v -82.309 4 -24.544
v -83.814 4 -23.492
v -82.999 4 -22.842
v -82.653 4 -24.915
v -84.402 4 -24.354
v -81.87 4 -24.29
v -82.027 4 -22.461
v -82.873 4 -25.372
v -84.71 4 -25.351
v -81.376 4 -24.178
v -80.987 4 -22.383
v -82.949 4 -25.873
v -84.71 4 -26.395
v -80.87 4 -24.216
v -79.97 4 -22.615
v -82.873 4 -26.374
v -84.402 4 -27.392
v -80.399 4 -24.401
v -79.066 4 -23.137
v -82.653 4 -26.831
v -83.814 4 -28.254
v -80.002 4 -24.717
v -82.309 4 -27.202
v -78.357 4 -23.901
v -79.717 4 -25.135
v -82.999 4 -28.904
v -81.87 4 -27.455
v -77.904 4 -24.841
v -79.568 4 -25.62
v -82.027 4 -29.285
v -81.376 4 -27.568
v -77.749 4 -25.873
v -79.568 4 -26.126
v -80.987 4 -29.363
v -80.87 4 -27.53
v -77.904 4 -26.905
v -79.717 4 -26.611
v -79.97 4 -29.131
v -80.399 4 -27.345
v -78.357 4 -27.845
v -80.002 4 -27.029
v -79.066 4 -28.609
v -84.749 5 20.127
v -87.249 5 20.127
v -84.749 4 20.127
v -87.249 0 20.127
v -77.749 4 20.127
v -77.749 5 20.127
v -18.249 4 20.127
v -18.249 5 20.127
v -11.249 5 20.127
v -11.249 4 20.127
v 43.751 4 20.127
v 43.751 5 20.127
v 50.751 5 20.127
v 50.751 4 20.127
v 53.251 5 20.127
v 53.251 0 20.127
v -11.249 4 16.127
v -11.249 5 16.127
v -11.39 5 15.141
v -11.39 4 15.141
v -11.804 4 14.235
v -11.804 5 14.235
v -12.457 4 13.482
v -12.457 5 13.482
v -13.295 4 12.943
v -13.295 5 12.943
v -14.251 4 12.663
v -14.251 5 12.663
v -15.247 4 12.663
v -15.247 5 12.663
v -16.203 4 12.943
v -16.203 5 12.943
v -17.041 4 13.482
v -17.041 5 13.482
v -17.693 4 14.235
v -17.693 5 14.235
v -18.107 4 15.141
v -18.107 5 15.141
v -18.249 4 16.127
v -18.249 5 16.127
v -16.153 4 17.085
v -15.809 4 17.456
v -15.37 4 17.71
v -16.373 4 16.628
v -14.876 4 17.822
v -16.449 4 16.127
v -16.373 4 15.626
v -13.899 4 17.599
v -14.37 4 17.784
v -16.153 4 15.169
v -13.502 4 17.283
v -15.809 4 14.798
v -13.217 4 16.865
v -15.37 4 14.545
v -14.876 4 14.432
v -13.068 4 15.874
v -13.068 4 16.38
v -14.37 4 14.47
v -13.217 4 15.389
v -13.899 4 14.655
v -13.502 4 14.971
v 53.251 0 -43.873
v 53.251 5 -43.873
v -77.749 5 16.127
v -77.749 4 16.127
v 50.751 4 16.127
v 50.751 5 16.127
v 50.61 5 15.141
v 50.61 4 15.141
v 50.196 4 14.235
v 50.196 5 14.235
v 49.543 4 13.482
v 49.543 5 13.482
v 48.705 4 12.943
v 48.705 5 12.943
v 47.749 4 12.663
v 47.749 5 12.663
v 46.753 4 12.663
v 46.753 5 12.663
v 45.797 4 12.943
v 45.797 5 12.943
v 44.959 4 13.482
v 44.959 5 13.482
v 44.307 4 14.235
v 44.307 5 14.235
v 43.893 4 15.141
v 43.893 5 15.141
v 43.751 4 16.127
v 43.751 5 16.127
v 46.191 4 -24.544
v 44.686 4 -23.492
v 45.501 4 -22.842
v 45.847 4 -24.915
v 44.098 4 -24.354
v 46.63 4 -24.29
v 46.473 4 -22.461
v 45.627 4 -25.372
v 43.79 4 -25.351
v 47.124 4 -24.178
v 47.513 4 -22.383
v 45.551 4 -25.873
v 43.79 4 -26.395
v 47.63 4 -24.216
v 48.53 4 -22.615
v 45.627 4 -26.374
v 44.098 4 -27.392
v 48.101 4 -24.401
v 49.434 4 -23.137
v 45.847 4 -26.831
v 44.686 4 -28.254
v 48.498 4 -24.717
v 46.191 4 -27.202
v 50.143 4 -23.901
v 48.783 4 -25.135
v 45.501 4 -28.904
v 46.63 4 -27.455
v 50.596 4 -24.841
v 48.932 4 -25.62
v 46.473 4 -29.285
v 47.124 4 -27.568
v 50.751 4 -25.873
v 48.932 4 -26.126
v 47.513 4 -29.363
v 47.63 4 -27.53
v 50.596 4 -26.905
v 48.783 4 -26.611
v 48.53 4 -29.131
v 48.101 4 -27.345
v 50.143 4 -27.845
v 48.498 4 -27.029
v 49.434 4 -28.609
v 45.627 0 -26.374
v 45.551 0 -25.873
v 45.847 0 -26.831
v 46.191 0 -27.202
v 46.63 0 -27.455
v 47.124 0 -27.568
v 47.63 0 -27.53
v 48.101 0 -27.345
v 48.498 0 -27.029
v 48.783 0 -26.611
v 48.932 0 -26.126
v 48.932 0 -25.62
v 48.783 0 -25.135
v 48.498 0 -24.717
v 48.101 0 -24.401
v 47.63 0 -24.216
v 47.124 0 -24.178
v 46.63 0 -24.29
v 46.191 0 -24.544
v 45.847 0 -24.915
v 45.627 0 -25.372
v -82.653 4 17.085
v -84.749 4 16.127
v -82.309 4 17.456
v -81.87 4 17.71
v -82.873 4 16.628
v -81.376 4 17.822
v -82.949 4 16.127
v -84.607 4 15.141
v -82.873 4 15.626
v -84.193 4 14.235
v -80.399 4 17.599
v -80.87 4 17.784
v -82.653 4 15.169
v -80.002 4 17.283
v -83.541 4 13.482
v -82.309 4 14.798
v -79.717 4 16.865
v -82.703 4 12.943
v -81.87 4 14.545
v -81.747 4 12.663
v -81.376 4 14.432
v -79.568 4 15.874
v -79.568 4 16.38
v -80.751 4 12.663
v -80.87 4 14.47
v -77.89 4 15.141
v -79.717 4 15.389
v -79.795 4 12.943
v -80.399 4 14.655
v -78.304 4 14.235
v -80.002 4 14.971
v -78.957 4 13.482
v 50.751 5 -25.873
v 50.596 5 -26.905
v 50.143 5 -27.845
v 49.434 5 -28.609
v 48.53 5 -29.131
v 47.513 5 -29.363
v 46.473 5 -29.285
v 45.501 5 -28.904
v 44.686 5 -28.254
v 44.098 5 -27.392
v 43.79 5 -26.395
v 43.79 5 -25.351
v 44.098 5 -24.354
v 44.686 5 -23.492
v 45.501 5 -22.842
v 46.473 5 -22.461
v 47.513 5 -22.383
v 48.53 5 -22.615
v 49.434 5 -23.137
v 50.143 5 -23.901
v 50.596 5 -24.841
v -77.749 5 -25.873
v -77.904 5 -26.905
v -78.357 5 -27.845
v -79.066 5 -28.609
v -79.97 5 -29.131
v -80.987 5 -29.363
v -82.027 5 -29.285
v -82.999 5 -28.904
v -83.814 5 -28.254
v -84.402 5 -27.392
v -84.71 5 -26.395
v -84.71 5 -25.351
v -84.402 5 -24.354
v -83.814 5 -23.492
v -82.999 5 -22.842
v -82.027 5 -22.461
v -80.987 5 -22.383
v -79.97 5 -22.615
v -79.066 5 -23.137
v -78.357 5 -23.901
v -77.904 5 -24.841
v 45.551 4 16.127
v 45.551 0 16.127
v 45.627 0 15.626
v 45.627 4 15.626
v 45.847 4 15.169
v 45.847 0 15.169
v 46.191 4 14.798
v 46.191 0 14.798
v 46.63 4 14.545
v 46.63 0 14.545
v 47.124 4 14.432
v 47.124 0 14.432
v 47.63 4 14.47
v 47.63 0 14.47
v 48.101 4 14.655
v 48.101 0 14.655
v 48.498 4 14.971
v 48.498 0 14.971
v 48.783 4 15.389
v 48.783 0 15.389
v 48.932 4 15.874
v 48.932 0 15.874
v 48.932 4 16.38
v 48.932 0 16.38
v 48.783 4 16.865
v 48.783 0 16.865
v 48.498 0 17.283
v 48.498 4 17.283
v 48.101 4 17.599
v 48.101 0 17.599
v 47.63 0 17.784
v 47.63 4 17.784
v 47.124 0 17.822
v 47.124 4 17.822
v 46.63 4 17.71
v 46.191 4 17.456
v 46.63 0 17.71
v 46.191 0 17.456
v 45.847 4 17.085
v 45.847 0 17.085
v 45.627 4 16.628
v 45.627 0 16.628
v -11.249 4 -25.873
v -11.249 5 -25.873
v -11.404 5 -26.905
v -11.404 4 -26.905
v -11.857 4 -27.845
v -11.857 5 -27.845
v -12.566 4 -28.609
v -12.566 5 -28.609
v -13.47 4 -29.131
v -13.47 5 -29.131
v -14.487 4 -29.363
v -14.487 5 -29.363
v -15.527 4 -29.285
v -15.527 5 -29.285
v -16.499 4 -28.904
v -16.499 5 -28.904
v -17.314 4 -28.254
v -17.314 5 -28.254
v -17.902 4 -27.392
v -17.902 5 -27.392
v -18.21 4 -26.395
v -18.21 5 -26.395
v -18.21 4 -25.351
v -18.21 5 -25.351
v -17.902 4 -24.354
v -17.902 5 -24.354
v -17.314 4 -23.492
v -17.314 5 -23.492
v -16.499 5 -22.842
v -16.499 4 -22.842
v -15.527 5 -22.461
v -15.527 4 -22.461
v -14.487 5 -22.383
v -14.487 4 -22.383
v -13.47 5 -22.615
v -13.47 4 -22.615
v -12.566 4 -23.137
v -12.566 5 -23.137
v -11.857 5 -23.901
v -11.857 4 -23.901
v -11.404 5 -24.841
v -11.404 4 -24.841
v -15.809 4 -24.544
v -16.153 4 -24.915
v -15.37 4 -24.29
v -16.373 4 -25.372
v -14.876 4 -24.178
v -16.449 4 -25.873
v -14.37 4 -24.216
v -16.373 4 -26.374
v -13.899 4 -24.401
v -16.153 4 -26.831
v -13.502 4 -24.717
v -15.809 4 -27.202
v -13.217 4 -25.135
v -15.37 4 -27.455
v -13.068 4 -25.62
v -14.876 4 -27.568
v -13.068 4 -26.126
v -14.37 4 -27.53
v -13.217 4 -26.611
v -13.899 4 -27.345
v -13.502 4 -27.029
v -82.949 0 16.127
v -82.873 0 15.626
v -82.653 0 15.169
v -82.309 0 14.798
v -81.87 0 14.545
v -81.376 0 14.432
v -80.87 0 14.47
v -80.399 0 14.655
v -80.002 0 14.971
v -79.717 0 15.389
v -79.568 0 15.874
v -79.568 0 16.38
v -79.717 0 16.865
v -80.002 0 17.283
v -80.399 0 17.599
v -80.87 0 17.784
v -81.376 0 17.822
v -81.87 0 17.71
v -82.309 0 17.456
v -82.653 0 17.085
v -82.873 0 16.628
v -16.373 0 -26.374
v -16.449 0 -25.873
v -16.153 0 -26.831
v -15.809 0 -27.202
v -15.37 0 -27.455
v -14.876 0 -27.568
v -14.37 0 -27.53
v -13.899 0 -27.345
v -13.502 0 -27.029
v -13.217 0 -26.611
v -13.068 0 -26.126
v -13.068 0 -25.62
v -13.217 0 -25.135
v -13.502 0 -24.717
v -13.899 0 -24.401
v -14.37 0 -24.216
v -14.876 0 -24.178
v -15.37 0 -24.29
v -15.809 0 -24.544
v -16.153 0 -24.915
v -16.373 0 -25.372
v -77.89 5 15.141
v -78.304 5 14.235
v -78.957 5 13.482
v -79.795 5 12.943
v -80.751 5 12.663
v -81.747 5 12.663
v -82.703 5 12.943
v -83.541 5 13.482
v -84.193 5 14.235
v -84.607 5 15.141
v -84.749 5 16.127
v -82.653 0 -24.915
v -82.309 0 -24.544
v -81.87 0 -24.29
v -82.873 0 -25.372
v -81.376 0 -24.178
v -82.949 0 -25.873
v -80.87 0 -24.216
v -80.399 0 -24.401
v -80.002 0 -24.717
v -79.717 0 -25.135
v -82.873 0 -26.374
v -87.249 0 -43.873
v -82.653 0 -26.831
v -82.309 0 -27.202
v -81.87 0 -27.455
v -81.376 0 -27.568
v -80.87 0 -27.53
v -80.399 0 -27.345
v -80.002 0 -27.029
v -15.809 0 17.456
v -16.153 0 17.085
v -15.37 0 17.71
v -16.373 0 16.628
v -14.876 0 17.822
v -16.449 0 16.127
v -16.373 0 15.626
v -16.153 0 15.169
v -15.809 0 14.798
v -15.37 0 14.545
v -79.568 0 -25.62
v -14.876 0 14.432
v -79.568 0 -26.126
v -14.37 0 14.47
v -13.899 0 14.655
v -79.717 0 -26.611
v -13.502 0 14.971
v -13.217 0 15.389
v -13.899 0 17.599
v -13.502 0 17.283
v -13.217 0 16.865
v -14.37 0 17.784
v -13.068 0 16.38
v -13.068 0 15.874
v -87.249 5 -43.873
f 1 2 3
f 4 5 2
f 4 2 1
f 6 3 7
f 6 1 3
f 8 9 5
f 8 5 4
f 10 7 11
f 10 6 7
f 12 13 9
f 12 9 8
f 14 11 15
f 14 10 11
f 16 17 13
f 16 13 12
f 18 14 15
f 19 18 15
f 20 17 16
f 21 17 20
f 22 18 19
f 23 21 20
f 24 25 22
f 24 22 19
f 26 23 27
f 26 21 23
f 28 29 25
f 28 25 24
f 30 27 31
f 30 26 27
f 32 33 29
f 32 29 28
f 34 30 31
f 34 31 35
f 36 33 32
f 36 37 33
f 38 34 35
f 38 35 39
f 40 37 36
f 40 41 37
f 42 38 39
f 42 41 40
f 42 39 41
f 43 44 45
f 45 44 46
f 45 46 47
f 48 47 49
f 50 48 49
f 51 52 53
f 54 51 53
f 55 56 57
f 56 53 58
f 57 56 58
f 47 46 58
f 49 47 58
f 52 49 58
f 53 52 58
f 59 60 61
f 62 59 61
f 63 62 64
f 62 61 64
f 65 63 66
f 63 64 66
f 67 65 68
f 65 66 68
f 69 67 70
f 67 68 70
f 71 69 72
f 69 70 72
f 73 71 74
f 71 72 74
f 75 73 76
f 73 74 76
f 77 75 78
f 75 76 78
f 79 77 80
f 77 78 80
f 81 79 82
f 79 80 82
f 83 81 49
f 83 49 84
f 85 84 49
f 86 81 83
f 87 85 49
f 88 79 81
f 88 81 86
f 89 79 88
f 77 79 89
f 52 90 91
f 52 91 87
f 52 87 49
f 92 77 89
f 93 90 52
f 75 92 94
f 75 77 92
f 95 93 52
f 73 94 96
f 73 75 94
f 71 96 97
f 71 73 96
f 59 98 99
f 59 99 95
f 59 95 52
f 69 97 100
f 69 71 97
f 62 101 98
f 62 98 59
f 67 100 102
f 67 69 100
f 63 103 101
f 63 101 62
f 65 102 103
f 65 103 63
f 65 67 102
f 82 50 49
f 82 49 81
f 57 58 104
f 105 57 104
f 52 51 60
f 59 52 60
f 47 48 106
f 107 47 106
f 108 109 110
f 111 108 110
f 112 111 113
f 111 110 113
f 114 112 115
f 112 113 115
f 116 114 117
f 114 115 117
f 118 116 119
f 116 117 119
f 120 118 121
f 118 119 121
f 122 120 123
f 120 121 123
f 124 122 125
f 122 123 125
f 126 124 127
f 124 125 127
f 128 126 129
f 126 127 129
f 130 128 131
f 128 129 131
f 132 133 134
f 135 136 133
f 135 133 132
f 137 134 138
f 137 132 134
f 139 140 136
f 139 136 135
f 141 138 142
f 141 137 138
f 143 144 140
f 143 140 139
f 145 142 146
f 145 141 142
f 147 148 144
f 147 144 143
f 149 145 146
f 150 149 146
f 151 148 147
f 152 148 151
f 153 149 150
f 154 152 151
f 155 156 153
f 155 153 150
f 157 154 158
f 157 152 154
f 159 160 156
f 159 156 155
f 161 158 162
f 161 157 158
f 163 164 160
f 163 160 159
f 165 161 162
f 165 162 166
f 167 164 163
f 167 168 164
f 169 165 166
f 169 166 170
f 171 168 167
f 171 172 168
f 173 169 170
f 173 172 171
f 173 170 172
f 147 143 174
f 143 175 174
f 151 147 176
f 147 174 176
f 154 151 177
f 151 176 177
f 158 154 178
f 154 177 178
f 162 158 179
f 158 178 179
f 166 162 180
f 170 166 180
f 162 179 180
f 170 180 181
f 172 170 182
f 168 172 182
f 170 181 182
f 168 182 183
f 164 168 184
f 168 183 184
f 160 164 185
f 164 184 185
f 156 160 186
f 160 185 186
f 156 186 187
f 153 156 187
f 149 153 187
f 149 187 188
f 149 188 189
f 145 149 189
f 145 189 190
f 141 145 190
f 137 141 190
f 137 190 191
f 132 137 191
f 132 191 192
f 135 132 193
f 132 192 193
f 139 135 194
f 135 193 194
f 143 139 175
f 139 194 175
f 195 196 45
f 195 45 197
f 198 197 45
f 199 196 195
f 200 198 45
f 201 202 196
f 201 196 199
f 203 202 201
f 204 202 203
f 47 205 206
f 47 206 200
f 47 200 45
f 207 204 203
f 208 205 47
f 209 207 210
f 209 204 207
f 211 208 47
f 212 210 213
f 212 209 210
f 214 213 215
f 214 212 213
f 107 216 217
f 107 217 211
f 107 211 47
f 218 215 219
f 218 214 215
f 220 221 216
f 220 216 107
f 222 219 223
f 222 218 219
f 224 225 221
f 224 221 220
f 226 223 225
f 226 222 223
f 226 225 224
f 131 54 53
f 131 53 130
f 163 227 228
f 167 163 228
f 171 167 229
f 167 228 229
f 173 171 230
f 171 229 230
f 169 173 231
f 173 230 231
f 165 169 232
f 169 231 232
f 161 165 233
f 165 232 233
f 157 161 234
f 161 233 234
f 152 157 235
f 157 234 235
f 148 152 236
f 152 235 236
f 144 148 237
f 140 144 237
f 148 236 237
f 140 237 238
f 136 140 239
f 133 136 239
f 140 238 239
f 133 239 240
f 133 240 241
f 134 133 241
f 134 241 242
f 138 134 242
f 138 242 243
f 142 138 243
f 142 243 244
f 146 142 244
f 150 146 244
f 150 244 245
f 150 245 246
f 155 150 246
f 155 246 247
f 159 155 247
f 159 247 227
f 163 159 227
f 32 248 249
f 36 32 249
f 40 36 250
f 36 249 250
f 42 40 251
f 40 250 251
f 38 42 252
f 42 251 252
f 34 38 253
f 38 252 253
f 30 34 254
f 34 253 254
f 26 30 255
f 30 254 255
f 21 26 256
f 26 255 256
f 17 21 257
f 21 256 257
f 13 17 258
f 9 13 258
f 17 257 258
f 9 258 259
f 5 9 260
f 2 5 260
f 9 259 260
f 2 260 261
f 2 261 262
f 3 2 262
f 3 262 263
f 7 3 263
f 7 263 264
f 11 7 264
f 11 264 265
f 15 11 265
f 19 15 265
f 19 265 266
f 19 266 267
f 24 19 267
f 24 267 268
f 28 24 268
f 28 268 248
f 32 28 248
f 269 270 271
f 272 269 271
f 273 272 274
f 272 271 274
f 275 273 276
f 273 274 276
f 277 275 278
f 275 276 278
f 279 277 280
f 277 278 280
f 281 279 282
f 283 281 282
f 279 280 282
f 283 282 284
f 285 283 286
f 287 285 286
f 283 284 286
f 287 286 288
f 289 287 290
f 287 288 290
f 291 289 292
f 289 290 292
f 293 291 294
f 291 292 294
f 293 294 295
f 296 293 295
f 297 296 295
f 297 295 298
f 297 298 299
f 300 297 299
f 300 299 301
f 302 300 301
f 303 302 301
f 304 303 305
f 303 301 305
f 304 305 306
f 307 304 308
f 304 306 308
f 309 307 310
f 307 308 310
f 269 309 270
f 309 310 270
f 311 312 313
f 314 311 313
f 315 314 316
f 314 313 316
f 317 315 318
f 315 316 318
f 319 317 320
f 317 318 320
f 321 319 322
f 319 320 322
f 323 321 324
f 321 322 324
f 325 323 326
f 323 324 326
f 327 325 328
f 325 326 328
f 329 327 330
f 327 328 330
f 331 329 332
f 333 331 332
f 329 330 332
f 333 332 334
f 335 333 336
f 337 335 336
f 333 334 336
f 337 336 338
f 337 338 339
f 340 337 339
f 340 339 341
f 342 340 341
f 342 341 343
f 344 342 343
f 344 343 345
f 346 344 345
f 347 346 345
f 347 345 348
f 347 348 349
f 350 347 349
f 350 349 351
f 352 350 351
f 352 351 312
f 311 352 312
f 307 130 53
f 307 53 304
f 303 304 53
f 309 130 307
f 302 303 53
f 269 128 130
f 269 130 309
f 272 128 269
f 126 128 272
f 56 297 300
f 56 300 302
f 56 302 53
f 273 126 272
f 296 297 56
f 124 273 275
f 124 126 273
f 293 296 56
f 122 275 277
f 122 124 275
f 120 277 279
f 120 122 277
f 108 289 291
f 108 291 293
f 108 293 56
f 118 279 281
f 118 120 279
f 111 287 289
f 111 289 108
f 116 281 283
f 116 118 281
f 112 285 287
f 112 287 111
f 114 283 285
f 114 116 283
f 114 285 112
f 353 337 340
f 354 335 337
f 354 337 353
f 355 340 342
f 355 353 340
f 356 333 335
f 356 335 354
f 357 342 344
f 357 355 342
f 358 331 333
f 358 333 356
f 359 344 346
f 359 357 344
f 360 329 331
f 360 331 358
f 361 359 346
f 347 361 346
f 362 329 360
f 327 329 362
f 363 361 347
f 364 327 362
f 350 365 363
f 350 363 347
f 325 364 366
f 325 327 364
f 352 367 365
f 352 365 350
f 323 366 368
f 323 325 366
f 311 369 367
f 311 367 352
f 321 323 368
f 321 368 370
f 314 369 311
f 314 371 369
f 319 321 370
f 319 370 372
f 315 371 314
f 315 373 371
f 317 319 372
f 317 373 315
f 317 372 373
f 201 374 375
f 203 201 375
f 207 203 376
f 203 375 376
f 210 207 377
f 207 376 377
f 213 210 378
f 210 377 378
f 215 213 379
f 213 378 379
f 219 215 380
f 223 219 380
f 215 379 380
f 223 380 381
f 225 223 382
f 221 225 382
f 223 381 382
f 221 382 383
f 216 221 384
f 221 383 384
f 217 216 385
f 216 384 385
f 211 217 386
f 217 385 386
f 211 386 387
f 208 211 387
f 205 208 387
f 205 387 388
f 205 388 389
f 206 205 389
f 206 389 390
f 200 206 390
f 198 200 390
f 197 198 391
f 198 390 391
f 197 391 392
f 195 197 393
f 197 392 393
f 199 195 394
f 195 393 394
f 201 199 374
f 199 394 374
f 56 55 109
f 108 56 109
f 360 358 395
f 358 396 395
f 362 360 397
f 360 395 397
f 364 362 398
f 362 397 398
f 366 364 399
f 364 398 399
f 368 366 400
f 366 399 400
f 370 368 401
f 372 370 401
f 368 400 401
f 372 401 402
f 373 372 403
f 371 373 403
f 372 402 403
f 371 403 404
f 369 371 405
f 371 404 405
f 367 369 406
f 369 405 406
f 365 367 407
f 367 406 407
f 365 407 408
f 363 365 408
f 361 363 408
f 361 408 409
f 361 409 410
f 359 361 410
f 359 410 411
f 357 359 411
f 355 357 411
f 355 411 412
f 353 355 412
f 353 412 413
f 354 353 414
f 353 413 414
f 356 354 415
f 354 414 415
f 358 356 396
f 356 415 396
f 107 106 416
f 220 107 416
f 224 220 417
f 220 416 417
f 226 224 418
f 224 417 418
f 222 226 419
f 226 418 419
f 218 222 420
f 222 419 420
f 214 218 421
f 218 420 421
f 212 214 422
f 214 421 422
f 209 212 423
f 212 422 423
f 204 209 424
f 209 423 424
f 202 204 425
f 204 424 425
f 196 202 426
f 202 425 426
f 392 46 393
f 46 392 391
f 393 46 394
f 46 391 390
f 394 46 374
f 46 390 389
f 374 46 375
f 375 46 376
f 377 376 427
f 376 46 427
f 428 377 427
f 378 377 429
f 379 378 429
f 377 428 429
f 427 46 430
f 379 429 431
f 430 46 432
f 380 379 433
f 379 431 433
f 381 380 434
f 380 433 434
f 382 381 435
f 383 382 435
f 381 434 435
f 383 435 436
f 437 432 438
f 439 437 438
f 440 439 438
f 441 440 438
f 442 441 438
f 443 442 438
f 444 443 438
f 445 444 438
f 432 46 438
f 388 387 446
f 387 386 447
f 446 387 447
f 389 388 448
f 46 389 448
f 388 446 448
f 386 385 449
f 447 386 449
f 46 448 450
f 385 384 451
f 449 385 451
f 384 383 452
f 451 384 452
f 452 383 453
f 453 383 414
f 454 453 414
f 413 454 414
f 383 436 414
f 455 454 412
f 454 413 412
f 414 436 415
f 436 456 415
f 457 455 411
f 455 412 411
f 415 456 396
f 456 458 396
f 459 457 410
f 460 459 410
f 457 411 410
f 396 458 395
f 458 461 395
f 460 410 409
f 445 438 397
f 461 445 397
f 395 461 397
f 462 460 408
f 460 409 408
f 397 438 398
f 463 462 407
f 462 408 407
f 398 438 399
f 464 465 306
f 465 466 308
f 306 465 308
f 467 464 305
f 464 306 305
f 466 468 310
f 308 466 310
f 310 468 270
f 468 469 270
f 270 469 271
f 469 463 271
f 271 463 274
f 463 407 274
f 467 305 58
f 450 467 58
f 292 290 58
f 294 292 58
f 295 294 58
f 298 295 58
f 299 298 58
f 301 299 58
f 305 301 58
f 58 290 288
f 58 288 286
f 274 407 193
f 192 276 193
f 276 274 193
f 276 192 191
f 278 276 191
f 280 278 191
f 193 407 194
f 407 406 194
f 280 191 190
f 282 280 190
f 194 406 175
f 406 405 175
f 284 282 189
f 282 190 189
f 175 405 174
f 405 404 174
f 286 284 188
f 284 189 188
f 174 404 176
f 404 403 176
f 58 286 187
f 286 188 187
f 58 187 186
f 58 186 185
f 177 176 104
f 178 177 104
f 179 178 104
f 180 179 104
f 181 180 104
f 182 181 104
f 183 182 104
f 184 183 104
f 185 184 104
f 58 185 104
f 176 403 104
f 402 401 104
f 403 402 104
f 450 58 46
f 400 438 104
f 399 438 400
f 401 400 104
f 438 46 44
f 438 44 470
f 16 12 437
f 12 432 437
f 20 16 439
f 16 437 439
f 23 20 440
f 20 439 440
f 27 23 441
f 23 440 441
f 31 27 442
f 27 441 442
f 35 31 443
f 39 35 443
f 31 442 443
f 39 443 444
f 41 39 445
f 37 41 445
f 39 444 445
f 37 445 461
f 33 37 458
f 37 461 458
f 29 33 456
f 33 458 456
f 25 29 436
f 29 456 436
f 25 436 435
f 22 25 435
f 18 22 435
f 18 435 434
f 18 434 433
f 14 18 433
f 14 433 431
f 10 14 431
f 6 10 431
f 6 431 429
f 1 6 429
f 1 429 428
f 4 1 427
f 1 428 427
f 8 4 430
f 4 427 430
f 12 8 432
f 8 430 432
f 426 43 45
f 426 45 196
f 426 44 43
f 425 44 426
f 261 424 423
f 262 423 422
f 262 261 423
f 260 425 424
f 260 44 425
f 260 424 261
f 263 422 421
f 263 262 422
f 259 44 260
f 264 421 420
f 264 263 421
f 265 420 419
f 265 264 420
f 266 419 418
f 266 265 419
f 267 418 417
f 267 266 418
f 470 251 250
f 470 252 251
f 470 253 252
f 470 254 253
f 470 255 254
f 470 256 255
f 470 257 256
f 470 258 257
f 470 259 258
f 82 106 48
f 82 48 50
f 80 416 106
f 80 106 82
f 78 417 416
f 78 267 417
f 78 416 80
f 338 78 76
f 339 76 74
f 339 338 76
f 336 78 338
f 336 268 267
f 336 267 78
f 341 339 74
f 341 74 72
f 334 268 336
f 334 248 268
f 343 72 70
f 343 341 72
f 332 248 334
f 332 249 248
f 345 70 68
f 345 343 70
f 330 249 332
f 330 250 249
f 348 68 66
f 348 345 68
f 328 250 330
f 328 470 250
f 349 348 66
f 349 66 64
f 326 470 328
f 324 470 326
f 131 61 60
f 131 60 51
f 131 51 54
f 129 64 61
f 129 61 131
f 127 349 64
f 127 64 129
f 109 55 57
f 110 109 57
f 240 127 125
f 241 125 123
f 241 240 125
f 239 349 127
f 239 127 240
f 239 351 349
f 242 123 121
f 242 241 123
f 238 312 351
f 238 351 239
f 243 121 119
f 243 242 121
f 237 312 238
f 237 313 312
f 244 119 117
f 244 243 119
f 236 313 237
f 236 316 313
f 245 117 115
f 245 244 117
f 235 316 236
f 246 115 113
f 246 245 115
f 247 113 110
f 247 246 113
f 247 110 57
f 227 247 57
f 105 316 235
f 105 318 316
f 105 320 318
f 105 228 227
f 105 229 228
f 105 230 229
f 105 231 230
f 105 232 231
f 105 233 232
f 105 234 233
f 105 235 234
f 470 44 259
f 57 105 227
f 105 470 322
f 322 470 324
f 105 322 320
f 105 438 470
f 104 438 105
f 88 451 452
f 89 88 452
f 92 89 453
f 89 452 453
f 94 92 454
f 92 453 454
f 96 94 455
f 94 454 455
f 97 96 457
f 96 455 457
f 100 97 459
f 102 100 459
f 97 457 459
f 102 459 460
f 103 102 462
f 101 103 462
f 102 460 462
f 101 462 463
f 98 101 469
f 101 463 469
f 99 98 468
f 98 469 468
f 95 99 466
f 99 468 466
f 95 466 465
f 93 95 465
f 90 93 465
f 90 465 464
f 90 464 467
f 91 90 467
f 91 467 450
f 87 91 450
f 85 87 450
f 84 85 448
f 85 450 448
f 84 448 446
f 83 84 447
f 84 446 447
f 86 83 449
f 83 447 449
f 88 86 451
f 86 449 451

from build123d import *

# Parameters (mm, degrees)
SKETCH_1_W                   = 140.5
SKETCH_1_H                   = 64
EXTRUDE_1_DEPTH              = 5
HOLE_WIZARD_M3_1_D           = 3.4
HOLE_WIZARD_M3_1_CBORE_D     = 7
HOLE_WIZARD_M3_1_CBORE_DEPTH = 1
SKETCH_4_W                   = 7
SKETCH_4_H                   = 4
CUT_EXTRUDE_1_DEPTH          = 1


with BuildPart() as part:
    # 草图1 → 凸台-拉伸1 (new body)
    with BuildSketch(Plane(origin=(0, 0, 0), x_dir=(1, 0, 0), z_dir=(0, 1, 0))):
        with Locations((-16.998618785, 11.872928177)):
            Rectangle(SKETCH_1_W, SKETCH_1_H)
    extrude(amount=EXTRUDE_1_DEPTH)

    # M3 六角头机械螺钉的柱形沉头孔1 (through all)
    with Locations(Plane(origin=(0, 5, 0), x_dir=(1, 0, 0), z_dir=(0, 1, 0))):
        with Locations((-81.248618785, 25.872928177), (-81.248618785, -16.127071823), (-14.748618785, 25.872928177), (-14.748618785, -16.127071823), (47.251381215, 25.872928177), (47.251381215, -16.127071823)):
            CounterBoreHole(HOLE_WIZARD_M3_1_D / 2, HOLE_WIZARD_M3_1_CBORE_D / 2, HOLE_WIZARD_M3_1_CBORE_DEPTH)

    # 草图4 → 切除-拉伸1 (cut)
    with BuildSketch(Plane(origin=(0, 5, 0), x_dir=(1, 0, 0), z_dir=(0, 1, 0))):
        with Locations((-81.248618785, -18.127071823)):
            Rectangle(SKETCH_4_W, SKETCH_4_H)
        with Locations((-14.748618785, -18.127071823)):
            Rectangle(SKETCH_4_W, SKETCH_4_H)
        with Locations((47.251381215, -18.127071823)):
            Rectangle(SKETCH_4_W, SKETCH_4_H)
    extrude(amount=-CUT_EXTRUDE_1_DEPTH, mode=Mode.SUBTRACT)


solid = part.part
